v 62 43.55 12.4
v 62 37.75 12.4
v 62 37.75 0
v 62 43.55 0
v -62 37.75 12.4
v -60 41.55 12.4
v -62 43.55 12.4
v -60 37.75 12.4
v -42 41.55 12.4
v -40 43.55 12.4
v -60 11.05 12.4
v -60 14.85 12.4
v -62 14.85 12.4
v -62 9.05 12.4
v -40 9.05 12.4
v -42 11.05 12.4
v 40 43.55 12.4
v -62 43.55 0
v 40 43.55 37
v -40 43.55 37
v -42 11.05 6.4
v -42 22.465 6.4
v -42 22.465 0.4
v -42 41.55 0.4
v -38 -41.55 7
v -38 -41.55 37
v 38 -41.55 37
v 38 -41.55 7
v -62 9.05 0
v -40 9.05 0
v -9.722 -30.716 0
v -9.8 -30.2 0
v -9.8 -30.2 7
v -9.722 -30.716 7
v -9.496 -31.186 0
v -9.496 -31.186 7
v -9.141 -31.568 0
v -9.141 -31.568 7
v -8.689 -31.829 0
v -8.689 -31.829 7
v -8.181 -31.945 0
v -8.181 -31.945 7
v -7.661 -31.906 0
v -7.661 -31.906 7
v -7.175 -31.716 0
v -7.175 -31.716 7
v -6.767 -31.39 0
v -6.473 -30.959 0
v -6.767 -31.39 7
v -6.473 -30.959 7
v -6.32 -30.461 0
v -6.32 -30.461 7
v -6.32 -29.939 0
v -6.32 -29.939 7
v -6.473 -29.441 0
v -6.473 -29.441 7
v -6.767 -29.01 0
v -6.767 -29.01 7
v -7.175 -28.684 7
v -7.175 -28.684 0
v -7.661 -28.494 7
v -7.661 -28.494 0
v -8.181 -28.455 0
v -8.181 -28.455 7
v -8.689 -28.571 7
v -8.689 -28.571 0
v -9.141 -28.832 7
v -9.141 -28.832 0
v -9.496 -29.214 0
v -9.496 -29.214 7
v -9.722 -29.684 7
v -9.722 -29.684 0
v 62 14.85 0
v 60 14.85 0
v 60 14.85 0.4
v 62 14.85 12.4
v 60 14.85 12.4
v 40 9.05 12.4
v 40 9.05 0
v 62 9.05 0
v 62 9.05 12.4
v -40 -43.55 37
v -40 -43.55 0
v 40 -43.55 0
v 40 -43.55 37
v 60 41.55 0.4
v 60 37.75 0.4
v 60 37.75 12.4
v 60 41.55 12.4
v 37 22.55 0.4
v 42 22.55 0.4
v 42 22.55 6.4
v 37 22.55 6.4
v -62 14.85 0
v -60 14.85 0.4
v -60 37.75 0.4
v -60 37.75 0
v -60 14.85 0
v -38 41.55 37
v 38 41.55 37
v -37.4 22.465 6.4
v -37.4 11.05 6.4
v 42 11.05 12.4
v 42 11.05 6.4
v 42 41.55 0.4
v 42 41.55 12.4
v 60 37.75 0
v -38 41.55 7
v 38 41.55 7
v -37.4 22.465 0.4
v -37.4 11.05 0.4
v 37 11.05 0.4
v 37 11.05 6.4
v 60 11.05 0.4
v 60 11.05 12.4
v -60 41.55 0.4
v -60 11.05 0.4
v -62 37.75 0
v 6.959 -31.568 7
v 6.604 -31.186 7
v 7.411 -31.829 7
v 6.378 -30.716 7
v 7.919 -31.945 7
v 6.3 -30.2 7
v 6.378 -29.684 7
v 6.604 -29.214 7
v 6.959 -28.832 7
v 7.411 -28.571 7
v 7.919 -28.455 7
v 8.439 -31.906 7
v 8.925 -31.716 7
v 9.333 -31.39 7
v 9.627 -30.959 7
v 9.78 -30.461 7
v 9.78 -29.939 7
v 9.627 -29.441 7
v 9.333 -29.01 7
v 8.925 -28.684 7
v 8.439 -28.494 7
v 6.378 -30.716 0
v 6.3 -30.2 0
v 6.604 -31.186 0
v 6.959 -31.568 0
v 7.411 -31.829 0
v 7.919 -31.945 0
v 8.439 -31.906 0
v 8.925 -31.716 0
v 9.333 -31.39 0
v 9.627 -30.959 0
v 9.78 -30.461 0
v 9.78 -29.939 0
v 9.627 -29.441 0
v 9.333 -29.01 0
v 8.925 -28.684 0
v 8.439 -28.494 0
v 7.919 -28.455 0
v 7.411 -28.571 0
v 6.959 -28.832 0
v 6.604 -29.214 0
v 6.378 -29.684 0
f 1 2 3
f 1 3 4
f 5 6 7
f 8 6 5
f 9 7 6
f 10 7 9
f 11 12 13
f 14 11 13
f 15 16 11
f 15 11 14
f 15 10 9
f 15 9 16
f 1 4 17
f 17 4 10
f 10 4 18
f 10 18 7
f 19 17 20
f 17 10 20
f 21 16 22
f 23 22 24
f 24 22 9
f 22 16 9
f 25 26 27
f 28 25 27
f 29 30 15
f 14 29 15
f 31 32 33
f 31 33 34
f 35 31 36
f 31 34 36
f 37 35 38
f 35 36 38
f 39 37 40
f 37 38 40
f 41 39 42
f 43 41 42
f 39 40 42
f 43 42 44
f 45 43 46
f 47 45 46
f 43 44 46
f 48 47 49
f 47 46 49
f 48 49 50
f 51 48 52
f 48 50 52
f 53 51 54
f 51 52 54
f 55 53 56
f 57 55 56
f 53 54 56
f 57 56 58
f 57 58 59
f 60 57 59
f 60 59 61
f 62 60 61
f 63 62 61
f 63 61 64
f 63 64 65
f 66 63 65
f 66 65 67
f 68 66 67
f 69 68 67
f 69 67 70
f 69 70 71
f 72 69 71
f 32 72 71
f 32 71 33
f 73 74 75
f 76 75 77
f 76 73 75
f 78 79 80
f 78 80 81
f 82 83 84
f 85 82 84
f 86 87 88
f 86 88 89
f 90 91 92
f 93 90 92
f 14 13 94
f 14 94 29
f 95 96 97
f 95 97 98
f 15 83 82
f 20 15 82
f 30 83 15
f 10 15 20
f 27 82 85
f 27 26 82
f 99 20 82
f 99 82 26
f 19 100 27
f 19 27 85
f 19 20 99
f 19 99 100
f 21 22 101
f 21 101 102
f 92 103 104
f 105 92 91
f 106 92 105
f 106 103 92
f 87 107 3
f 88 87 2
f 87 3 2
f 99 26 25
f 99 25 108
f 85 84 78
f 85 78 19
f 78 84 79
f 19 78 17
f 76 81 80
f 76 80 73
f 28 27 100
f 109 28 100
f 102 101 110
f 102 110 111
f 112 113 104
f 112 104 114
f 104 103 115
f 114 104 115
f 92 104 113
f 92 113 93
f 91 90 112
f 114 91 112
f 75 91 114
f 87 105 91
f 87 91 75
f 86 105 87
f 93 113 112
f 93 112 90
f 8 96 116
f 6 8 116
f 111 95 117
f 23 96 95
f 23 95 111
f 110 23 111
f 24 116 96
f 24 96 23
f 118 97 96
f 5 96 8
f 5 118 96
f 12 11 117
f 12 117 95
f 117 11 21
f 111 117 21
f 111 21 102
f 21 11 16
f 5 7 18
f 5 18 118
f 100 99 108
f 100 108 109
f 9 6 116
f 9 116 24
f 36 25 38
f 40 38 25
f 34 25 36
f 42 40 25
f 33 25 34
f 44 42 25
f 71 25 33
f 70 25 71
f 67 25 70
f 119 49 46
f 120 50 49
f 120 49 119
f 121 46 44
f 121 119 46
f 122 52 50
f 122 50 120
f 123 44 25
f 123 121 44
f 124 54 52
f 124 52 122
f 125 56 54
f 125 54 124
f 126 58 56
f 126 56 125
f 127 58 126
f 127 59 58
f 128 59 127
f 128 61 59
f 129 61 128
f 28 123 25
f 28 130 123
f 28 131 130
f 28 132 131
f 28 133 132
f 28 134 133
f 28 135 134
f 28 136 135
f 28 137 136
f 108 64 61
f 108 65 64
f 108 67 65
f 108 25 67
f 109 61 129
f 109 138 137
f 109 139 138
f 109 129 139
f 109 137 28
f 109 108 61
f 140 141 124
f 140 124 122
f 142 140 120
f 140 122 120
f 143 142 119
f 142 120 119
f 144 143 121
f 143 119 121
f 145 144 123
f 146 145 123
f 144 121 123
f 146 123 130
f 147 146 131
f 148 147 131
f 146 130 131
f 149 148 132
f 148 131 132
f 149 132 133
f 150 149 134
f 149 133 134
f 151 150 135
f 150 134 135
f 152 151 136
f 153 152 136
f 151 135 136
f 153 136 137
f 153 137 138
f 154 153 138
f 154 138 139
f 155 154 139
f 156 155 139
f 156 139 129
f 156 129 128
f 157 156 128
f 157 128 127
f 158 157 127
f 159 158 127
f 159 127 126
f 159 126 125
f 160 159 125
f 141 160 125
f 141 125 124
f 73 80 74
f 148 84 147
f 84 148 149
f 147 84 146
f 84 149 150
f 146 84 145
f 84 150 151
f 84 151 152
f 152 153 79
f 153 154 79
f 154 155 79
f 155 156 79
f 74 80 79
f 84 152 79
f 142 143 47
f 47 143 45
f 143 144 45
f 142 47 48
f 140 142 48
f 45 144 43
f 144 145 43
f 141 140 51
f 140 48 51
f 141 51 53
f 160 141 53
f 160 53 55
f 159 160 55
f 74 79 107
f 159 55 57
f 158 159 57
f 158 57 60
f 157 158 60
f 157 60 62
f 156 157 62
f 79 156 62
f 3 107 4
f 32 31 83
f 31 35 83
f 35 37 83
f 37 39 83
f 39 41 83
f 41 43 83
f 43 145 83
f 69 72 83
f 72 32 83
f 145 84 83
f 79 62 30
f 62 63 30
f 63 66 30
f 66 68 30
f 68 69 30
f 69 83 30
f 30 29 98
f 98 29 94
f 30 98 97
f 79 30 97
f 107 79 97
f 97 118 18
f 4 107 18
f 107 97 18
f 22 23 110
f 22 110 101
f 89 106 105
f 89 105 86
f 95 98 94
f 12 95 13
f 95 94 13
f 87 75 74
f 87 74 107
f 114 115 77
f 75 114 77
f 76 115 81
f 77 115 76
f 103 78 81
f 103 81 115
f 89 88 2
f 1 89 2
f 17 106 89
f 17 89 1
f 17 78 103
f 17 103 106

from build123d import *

# Parameters (mm, degrees)
F0_W      = 80
F0_H      = 87.1
F1_DEPTH  = 37
F2_W      = 76
F2_H      = 83.1
F3_DEPTH  = 30
F5_D      = 3.5
F6_W      = 34.5
F6_H      = 12.4
F7_DEPTH  = 22
F8_W      = 18
F8_H      = 30.5
F9_DEPTH  = 12
F10_W     = 11.415408
F10_H     = 6
F11_DEPTH = 4.60036
F12_W     = 34.5
F12_H     = 12.4
F13_DEPTH = 22
F14_W     = 18
F14_H     = 30.5
F15_DEPTH = 12
F16_W     = 11.5
F16_H     = 6
F17_DEPTH = 5
F19_W     = 22.9
F19_H     = 12.4
F20_DEPTH = 2
F18_W     = 22.9
F18_H     = 12.4
F21_DEPTH = 2


with BuildPart() as f1:
    # F0 (on Top) → F1 (new body)
    with BuildSketch(Plane.XY):
        Rectangle(F0_W, F0_H)
    extrude(amount=F1_DEPTH)

    # F2 (on face) → F3 (cut)
    with BuildSketch(Plane.XY.offset(37)):
        Rectangle(F2_W, F2_H)
    extrude(amount=-F3_DEPTH, mode=Mode.SUBTRACT)

    # F5 (through all)
    with Locations(Plane(origin=(0, 0, 0), x_dir=(1, 0, 0), z_dir=(0, 0, -1))):
        with Locations((-8.05, 30.2), (8.05, 30.2)):
            Hole(F5_D / 2)

    # F6 (on face) → F7 (join)
    with BuildSketch(Plane(origin=(-40, 0, 0), x_dir=(0, -1, 0), z_dir=(-1, 0, 0))):
        with Locations((-26.3, 6.2)):
            Rectangle(F6_W, F6_H)
    extrude(amount=F7_DEPTH)

    # F8 (on face) → F9 (cut)
    with BuildSketch(Plane.XY.offset(12.4)):
        with Locations((-51, 26.3)):
            Rectangle(F8_W, F8_H)
    extrude(amount=-F9_DEPTH, mode=Mode.SUBTRACT)

    # F10 (on face) → F11 (cut)
    with BuildSketch(Plane(origin=(-42, 0, 0), x_dir=(0, -1, 0), z_dir=(-1, 0, 0))):
        with Locations((-16.757704, 3.4)):
            Rectangle(F10_W, F10_H)
    extrude(amount=-F11_DEPTH, mode=Mode.SUBTRACT)

    # F12 (on face) → F13 (join)
    with BuildSketch(Plane.YZ.offset(40)):
        with Locations((26.3, 6.2)):
            Rectangle(F12_W, F12_H)
    extrude(amount=F13_DEPTH)

    # F14 (on face) → F15 (cut)
    with BuildSketch(Plane.XY.offset(12.4)):
        with Locations((51, 26.3)):
            Rectangle(F14_W, F14_H)
    extrude(amount=-F15_DEPTH, mode=Mode.SUBTRACT)

    # F16 (on face) → F17 (cut)
    with BuildSketch(Plane.YZ.offset(42)):
        with Locations((16.8, 3.4)):
            Rectangle(F16_W, F16_H)
    extrude(amount=-F17_DEPTH, mode=Mode.SUBTRACT)

    # F19 (on face) → F20 (cut)
    with BuildSketch(Plane(origin=(-62, 0, 0), x_dir=(0, -1, 0), z_dir=(-1, 0, 0))):
        with Locations((-26.3, 6.2)):
            Rectangle(F19_W, F19_H)
    extrude(amount=-F20_DEPTH, mode=Mode.SUBTRACT)

    # F18 (on face) → F21 (cut)
    with BuildSketch(Plane.YZ.offset(62)):
        with Locations((26.3, 6.2)):
            Rectangle(F18_W, F18_H)
    extrude(amount=-F21_DEPTH, mode=Mode.SUBTRACT)


solid = f1.part
